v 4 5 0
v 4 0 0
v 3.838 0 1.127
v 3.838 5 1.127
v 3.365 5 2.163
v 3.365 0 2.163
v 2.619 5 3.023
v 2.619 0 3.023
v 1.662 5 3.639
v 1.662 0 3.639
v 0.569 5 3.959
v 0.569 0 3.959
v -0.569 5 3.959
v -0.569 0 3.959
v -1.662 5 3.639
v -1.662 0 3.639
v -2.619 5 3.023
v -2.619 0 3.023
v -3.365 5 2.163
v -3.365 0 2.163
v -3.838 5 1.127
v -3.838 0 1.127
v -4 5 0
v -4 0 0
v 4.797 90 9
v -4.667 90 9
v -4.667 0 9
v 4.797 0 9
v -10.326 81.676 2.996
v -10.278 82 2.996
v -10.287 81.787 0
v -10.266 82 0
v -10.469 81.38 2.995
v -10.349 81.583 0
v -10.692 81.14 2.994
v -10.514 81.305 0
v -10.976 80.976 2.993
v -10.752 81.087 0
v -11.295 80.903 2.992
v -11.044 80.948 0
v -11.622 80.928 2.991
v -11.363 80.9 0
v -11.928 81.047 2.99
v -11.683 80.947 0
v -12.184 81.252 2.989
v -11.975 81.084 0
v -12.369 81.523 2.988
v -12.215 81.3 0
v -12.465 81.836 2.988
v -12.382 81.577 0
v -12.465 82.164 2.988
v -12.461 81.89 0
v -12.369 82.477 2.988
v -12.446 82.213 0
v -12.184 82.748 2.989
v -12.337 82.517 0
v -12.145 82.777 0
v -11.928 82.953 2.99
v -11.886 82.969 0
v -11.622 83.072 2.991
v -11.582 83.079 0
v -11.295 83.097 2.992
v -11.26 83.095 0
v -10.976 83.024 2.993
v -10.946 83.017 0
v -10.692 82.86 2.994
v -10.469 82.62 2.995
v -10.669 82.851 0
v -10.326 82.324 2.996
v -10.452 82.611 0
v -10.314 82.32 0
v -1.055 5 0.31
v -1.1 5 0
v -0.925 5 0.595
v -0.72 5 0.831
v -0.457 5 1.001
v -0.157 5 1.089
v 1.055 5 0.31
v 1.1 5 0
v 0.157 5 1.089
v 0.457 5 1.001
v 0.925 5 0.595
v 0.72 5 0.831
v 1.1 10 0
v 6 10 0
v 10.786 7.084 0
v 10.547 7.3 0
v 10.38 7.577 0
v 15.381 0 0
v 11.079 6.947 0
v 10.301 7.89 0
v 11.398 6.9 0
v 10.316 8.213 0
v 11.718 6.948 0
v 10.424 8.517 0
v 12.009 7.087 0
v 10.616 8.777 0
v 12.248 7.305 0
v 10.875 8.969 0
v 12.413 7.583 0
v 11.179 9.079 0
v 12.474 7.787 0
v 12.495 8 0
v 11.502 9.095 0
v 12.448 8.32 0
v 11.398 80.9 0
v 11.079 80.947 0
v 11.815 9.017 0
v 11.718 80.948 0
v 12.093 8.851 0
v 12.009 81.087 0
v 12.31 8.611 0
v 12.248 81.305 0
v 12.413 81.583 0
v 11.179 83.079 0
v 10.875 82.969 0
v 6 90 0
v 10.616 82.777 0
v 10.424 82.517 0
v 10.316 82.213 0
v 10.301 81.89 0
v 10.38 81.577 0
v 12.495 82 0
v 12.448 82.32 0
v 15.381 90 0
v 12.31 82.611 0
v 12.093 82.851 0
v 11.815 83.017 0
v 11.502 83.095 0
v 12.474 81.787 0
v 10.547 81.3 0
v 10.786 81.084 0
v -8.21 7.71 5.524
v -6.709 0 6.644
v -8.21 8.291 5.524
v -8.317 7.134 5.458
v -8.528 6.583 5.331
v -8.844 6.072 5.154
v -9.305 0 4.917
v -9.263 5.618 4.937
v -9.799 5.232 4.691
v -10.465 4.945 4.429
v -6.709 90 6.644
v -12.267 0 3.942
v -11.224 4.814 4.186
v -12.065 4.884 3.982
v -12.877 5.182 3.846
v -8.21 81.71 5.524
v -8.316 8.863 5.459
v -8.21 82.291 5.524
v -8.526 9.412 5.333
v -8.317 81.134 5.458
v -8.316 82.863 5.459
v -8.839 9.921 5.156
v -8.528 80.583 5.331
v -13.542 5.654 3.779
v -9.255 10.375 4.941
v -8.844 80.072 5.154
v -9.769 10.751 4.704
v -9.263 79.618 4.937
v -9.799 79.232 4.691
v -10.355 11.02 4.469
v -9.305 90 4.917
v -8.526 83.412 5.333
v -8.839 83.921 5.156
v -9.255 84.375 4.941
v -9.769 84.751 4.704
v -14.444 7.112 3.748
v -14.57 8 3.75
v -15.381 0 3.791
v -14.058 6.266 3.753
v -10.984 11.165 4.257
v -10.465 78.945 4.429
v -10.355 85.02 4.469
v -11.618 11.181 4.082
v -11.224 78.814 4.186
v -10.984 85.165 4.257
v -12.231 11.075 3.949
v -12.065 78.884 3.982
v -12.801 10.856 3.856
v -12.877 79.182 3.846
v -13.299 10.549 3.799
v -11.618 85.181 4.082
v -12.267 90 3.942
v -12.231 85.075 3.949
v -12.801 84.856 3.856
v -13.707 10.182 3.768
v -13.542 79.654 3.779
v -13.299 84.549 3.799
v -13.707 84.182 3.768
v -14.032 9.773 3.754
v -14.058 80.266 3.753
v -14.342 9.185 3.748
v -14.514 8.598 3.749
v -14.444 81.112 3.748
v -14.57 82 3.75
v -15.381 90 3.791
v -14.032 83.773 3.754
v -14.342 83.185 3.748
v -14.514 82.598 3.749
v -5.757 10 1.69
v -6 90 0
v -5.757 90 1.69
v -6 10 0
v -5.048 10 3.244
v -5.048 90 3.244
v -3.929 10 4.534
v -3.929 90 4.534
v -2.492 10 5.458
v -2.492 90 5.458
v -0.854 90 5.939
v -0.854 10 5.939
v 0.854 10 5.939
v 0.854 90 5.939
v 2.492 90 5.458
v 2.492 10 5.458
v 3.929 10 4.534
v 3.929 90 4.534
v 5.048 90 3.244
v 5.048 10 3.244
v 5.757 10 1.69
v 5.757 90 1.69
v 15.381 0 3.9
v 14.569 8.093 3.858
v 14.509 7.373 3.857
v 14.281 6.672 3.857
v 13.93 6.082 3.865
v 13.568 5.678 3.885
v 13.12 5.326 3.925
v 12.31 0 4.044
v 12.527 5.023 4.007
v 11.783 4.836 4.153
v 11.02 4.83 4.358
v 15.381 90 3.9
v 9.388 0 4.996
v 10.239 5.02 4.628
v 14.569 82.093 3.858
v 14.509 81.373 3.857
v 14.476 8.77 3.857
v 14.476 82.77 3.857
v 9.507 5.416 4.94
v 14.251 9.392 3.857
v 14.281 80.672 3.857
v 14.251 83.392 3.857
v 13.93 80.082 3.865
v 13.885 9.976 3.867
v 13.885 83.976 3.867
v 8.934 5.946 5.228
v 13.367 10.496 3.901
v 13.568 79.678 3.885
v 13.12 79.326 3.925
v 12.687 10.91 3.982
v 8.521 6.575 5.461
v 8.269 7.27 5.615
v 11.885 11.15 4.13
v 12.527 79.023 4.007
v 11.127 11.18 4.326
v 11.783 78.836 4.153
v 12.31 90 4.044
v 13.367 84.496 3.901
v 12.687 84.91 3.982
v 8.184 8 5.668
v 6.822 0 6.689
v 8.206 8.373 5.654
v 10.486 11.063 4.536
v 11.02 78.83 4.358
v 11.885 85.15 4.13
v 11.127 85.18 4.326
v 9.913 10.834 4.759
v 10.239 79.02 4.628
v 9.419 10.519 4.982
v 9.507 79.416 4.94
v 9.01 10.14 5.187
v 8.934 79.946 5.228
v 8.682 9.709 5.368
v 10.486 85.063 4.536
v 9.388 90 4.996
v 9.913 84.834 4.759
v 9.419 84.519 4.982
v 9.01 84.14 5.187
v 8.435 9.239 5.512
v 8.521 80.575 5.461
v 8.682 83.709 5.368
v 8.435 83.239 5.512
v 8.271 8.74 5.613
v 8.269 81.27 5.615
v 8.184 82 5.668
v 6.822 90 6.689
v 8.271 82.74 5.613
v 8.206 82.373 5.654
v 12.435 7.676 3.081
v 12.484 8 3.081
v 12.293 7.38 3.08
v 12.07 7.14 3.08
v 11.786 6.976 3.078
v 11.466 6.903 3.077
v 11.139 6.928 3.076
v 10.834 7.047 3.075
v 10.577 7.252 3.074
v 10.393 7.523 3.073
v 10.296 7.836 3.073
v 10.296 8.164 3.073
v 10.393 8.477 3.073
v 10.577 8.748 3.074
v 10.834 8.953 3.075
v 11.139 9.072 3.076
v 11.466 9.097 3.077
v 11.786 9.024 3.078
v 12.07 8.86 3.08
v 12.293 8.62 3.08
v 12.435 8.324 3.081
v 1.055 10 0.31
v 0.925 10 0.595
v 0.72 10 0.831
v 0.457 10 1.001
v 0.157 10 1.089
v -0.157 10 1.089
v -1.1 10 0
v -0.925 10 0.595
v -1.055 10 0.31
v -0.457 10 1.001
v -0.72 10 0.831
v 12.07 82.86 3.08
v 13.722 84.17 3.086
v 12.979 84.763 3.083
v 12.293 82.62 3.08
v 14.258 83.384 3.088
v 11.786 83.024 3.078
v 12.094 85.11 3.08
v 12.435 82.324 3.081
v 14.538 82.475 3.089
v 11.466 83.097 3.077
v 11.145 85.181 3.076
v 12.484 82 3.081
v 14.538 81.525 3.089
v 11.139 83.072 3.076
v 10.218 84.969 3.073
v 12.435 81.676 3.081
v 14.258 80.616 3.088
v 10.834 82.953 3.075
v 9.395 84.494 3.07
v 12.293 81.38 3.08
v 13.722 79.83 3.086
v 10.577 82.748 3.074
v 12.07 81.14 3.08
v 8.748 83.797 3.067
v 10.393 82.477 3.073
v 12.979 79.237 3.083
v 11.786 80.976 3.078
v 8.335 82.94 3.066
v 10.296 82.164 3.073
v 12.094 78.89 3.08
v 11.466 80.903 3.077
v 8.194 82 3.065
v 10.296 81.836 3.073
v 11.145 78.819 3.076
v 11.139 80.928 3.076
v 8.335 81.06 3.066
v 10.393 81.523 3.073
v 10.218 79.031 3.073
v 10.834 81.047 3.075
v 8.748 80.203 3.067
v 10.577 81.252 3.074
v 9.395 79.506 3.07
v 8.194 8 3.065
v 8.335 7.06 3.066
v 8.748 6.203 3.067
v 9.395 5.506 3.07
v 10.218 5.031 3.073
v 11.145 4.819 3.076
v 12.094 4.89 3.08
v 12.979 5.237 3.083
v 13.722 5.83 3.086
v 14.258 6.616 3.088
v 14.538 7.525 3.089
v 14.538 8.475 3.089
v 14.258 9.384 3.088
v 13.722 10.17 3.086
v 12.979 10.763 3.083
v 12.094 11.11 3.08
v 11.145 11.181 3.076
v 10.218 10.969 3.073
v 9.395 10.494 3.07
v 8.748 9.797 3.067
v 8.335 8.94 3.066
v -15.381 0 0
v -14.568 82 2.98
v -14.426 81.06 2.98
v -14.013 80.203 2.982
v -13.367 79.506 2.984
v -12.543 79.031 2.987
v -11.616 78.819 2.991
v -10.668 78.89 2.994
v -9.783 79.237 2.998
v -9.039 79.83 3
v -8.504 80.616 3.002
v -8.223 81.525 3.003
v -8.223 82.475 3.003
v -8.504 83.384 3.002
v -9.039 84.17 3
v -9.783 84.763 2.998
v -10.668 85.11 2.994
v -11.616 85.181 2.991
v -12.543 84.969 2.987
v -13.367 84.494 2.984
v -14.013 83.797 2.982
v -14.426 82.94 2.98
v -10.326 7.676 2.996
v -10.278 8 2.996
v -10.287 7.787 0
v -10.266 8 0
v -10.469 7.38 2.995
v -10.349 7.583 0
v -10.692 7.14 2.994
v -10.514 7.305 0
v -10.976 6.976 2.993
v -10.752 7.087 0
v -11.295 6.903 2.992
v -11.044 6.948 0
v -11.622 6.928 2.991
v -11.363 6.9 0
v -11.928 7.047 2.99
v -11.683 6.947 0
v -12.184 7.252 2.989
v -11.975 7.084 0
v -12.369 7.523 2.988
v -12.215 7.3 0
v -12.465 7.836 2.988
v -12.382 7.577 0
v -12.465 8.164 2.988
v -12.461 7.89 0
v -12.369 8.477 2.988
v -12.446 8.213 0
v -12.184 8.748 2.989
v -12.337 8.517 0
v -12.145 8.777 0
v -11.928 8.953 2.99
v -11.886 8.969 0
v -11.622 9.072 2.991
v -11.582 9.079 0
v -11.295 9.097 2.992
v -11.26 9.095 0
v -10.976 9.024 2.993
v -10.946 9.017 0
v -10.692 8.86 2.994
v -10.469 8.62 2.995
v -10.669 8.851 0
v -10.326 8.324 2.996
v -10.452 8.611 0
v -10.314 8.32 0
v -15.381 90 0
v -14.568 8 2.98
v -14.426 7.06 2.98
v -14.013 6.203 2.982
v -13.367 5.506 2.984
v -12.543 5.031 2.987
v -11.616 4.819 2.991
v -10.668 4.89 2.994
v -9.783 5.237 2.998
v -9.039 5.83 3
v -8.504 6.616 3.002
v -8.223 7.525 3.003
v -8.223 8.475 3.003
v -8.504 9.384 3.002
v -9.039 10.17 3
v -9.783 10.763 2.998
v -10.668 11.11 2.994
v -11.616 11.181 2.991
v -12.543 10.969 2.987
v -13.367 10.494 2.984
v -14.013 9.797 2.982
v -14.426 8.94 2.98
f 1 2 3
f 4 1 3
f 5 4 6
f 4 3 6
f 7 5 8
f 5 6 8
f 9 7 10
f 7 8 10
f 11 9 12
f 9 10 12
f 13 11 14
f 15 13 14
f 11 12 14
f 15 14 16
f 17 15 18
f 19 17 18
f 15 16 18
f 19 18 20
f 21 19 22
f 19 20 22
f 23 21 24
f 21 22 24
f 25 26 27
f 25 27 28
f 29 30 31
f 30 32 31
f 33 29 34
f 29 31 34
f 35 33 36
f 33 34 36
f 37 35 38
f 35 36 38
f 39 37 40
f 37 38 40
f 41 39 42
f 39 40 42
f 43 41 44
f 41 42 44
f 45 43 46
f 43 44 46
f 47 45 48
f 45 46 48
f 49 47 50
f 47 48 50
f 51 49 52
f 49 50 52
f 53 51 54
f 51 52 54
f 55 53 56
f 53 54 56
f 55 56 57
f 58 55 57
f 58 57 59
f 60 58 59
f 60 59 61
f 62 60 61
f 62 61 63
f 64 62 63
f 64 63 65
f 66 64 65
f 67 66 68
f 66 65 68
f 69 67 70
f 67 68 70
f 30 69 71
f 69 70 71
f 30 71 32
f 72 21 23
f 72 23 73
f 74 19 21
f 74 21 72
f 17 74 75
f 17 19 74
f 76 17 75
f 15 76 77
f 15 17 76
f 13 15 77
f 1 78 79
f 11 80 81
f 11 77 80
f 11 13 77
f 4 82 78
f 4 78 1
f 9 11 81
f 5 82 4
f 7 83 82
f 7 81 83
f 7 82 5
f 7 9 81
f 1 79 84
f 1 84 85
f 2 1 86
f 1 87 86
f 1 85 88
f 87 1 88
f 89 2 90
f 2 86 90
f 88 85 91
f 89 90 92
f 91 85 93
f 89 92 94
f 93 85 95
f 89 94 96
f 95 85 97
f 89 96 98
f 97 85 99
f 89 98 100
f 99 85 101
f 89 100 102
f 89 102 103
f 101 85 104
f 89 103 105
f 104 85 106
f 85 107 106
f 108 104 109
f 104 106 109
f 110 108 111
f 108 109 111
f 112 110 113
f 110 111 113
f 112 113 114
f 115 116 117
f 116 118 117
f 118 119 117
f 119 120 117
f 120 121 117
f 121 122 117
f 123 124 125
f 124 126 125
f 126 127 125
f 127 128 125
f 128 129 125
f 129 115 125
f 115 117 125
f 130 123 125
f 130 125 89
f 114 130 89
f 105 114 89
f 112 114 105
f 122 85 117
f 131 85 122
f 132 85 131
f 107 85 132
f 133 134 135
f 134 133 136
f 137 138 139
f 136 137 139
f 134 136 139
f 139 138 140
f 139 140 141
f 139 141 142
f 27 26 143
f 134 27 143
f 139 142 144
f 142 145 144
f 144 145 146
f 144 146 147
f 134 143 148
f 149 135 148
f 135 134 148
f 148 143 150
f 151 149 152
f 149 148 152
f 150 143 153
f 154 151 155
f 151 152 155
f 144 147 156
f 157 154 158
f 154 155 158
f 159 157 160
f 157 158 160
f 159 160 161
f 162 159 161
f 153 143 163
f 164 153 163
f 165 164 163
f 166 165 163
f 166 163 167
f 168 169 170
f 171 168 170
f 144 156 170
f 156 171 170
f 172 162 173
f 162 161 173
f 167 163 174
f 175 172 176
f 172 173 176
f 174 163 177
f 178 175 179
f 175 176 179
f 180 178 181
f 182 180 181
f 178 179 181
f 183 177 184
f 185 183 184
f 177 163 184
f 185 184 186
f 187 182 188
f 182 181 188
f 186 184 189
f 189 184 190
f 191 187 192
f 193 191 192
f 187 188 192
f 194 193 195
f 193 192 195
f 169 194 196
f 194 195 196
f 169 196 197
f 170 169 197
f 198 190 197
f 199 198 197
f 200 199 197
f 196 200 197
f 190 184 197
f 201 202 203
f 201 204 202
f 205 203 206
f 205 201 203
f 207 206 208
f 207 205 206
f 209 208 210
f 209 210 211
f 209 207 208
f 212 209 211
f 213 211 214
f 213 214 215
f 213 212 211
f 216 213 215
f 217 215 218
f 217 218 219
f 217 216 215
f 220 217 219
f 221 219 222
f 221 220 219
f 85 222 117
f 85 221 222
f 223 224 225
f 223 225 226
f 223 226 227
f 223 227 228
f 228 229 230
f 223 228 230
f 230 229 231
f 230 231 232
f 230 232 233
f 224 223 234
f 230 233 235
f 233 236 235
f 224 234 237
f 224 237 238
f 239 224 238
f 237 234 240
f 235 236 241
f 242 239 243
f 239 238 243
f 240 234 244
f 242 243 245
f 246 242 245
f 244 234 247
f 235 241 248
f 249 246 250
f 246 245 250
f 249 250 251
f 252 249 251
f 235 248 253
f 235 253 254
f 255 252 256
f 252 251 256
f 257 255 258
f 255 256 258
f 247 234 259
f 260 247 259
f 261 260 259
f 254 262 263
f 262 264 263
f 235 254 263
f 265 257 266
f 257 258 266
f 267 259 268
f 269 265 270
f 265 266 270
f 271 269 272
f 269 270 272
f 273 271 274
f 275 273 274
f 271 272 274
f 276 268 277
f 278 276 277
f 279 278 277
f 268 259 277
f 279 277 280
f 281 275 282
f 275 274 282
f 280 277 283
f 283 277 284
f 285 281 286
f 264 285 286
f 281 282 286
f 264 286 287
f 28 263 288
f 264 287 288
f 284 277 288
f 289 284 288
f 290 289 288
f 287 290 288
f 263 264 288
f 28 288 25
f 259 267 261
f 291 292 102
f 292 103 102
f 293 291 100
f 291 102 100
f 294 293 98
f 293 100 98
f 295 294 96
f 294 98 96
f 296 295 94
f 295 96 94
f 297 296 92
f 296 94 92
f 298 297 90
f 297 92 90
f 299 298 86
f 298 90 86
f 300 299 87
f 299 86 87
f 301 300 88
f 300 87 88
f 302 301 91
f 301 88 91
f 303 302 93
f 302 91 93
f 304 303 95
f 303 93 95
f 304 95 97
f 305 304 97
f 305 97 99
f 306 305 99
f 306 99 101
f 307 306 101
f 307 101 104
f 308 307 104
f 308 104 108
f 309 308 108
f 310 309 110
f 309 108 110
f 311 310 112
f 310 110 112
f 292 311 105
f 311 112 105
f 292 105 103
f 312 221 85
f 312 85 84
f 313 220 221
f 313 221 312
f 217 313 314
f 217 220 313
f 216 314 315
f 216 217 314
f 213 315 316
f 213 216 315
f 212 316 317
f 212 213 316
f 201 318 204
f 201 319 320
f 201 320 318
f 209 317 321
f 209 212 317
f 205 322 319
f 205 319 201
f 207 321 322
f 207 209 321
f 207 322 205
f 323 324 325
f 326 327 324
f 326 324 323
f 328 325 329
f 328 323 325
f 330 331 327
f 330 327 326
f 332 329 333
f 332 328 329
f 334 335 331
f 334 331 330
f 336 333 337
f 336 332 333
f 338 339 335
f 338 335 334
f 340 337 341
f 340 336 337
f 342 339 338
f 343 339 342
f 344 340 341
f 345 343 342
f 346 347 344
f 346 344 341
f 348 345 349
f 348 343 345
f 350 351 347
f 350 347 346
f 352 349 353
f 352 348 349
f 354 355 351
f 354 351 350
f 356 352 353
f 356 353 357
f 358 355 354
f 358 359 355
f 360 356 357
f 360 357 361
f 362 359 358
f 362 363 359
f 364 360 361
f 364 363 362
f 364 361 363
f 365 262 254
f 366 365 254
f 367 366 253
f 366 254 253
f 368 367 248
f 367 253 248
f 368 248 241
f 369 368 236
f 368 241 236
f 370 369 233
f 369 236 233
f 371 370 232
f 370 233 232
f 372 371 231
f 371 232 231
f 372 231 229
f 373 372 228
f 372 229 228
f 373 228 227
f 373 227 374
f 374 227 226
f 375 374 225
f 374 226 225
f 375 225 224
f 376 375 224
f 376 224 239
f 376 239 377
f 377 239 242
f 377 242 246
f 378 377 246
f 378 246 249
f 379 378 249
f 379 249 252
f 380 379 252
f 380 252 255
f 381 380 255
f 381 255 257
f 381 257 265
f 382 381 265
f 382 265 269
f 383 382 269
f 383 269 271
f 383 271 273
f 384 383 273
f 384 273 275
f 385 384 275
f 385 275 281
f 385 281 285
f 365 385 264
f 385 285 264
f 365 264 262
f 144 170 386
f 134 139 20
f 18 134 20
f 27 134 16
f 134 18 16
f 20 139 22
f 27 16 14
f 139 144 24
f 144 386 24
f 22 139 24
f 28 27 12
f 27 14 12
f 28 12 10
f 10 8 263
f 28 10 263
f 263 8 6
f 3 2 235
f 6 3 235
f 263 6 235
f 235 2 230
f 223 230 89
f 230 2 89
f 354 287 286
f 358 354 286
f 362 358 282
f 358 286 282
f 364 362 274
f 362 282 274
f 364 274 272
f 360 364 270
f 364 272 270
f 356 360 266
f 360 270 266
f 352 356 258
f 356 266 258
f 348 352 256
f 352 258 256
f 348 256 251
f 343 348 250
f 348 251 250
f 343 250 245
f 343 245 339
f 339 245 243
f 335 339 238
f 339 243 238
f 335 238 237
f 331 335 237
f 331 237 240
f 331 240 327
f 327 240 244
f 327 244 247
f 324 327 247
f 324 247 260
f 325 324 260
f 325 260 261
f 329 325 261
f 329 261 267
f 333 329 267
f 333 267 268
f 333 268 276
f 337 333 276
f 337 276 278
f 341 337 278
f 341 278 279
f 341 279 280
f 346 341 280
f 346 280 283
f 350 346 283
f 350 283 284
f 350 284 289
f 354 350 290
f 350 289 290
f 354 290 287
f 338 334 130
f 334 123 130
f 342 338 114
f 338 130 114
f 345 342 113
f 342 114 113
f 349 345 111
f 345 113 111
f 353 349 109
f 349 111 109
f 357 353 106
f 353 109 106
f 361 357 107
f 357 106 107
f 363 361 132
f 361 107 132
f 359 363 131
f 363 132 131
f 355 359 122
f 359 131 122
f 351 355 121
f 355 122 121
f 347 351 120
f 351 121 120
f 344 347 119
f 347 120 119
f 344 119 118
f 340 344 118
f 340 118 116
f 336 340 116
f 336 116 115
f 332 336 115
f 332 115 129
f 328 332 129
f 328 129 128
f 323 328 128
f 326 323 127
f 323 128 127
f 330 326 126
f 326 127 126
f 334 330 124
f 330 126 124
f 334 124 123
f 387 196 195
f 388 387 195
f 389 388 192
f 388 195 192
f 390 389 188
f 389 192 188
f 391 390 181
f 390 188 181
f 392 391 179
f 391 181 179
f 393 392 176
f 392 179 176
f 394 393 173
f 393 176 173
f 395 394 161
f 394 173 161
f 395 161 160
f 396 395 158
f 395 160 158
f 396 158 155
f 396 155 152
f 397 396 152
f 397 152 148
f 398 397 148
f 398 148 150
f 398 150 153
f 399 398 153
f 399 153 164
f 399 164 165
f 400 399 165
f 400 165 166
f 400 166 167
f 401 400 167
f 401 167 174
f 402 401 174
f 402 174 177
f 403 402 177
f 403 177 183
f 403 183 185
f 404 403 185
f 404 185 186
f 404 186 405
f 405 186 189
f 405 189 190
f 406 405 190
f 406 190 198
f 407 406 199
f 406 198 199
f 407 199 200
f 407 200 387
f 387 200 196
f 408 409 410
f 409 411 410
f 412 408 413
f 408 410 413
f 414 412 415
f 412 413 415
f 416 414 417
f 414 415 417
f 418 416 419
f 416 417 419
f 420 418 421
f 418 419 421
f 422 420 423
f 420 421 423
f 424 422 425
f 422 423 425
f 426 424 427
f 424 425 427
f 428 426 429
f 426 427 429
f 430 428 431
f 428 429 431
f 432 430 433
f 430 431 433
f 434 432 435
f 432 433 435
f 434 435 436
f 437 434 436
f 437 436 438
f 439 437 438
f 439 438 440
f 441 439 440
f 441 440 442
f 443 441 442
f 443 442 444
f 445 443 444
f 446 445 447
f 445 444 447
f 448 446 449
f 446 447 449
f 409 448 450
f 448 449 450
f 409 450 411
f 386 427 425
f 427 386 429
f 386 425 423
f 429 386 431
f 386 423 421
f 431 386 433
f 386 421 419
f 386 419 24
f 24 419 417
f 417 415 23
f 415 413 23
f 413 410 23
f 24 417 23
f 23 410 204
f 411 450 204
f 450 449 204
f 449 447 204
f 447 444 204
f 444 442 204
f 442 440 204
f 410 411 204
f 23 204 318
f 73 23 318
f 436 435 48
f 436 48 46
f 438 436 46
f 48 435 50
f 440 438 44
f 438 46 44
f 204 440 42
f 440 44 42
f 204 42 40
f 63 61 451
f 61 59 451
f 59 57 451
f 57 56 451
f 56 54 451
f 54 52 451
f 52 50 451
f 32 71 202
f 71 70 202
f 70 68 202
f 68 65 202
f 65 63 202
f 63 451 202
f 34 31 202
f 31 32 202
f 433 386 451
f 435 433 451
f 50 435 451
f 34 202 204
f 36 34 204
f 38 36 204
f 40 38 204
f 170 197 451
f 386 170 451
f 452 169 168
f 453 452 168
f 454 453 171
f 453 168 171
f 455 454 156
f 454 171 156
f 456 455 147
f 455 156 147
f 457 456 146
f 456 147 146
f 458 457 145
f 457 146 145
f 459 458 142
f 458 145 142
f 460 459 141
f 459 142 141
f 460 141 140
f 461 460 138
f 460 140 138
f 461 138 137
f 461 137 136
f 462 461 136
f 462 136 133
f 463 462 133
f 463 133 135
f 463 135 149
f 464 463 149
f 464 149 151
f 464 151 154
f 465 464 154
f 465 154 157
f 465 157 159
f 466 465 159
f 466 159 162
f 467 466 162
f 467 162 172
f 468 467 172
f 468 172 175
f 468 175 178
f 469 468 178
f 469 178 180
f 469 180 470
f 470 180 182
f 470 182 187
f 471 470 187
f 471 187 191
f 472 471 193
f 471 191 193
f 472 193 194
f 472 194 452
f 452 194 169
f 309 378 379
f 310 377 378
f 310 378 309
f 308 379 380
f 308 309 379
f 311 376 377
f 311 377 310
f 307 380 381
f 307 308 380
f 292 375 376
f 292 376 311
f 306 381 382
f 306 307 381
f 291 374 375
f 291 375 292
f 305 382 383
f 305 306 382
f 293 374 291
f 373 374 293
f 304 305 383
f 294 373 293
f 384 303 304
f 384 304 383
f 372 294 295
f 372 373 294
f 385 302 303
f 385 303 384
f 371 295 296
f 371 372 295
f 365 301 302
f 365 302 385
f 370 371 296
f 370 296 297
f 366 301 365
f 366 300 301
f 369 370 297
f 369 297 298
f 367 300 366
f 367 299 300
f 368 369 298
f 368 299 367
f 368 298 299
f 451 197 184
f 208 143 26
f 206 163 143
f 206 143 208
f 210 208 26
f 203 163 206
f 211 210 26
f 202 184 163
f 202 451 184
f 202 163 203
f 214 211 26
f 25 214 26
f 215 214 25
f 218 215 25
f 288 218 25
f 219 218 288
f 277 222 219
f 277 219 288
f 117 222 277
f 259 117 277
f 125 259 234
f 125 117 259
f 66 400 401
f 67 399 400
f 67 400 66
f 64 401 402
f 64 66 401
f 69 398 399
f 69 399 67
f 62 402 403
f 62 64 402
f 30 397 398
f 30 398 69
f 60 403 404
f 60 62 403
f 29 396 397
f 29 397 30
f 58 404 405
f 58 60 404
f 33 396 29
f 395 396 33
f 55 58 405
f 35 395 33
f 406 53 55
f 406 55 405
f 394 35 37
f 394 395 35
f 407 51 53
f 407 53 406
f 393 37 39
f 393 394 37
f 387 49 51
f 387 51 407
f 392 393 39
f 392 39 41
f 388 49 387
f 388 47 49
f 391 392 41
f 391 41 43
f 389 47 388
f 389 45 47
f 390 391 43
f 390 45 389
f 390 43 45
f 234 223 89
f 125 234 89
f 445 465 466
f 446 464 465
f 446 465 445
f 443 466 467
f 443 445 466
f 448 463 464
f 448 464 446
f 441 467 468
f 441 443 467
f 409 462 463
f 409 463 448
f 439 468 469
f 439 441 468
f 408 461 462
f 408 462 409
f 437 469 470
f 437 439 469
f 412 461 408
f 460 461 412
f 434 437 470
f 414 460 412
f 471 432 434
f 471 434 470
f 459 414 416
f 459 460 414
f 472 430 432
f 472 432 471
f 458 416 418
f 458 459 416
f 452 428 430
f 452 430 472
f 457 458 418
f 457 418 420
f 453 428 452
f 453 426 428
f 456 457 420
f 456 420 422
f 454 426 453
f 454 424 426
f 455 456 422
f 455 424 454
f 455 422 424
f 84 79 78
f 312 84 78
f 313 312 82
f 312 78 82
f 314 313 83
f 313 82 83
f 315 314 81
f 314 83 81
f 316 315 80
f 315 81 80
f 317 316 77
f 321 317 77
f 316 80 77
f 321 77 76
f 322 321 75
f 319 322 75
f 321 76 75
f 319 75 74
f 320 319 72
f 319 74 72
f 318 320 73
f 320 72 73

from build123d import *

# Parameters (mm, degrees)
ROTATION1_ANGLE                                     = 180
SCHNITT_LINEAR_AUSTRAGEN2_DEPTH                     = 92.33454987
SCHNITT_LINEAR_AUSTRAGEN2_DEPTH_BACK                = 90
SCHNITT_LINEAR_AUSTRAGEN3_DEPTH                     = 92.33454987
SCHNITT_LINEAR_AUSTRAGEN3_DEPTH_BACK                = 90
SKIZZE8_W                                           = 10
SKIZZE8_H                                           = 5
AUFSATZ_LINEAR_AUSTRAGEN2_DEPTH                     = 90
SKIZZE9_W                                           = 10
SKIZZE9_H                                           = 5
AUFSATZ_LINEAR_AUSTRAGEN3_DEPTH                     = 90
SKIZZE16_R                                          = 1.1
SCHNITT_LINEAR_AUSTRAGEN8_DEPTH                     = 93.717898057
SKIZZE18_R                                          = 4
SCHNITT_LINEAR_AUSTRAGEN9_DEPTH                     = 5
SKIZZE20_W                                          = 21.700648505
SKIZZE20_H                                          = 2
SCHNITT_LINEAR_AUSTRAGEN10_DEPTH                    = 93.717898057
SKIZZE22_R                                          = 11.608493419
SKIZZE22_R_2                                        = 11.500591483
SCHNITT_LINEAR_AUSTRAGEN17_DEPTH                    = 93.501938467
SKIZZE24_W                                          = 4
SKIZZE24_H                                          = 5
SCHNITT_LINEAR_AUSTRAGEN18_DEPTH                    = 93.501938467
STIRNSENKUNG_F_R_M2_SECHSKANTSCHRAUBE_G_D           = 2.2
STIRNSENKUNG_F_R_M2_SECHSKANTSCHRAUBE_G_DEPTH       = 12
STIRNSENKUNG_F_R_M2_SECHSKANTSCHRAUBE_G_CBORE_D     = 6.38
STIRNSENKUNG_F_R_M2_SECHSKANTSCHRAUBE_G_CBORE_DEPTH = 3.1
STIRNSENKUNG_F_R_M2_SECHSKANTSCHRAUBE_G_TIP         = 0.660946681


with BuildPart() as part:
    # Skizze3 → Rotation1 (revolve)
    with BuildSketch(Plane.XY):
        Polygon((0, 0), (-11, 0), (-11, 90), (-6, 90), (-6, 10), (0, 10), align=None)
    revolve(axis=Axis((0, 0, 0), (0, 1, 0)), revolution_arc=ROTATION1_ANGLE)

    # Skizze6 → Schnitt-Linear austragen2 (cut, two sides: drawn at the far end of the back side and taken through both)
    with BuildSketch(Plane(origin=(0, 90, 0), x_dir=(1, 0, 0), z_dir=(0, 1, 0)).offset(-SCHNITT_LINEAR_AUSTRAGEN2_DEPTH_BACK)):
        Polygon((-9.380624863, -62.0642209), (-9.380624863, -5.744900102), (-9.380624863, 0), (-9.380624863, 56.319320799), (-122.01926646, 56.319320799), (-122.01926646, -62.0642209), align=None)
    extrude(amount=SCHNITT_LINEAR_AUSTRAGEN2_DEPTH + SCHNITT_LINEAR_AUSTRAGEN2_DEPTH_BACK, mode=Mode.SUBTRACT)

    # Skizze7 → Schnitt-Linear austragen3 (cut, two sides: drawn at the far end of the back side and taken through both)
    with BuildSketch(Plane.XZ.offset(-SCHNITT_LINEAR_AUSTRAGEN3_DEPTH_BACK)):
        Polygon((9.380624863, 59.241313346), (9.380624863, 5.744900102), (9.380624863, 0), (9.380624863, -53.496413245), (116.373451353, -53.496413245), (116.373451353, 59.241313346), align=None)
    extrude(amount=SCHNITT_LINEAR_AUSTRAGEN3_DEPTH + SCHNITT_LINEAR_AUSTRAGEN3_DEPTH_BACK, mode=Mode.SUBTRACT)

    # Skizze8 → Aufsatz-Linear austragen2 (add)
    with BuildSketch(Plane(origin=(0, 90, 0), x_dir=(1, 0, 0), z_dir=(0, 1, 0))):
        with Locations((-14.380624863, -2.5)):
            Rectangle(SKIZZE8_W, SKIZZE8_H)
    extrude(amount=-AUFSATZ_LINEAR_AUSTRAGEN2_DEPTH)

    # Skizze9 → Aufsatz-Linear austragen3 (add)
    with BuildSketch(Plane(origin=(0, 90, 0), x_dir=(1, 0, 0), z_dir=(0, 1, 0))):
        with Locations((14.380624863, -2.5)):
            Rectangle(SKIZZE9_W, SKIZZE9_H)
    extrude(amount=-AUFSATZ_LINEAR_AUSTRAGEN3_DEPTH)

    # Skizze16 → Schnitt-Linear austragen8 (cut, through all)
    with BuildSketch(Plane.XZ):
        Circle(SKIZZE16_R)
    extrude(amount=-SCHNITT_LINEAR_AUSTRAGEN8_DEPTH, mode=Mode.SUBTRACT)

    # Skizze18 → Schnitt-Linear austragen9 (cut)
    with BuildSketch(Plane.XZ):
        Circle(SKIZZE18_R)
    extrude(amount=-SCHNITT_LINEAR_AUSTRAGEN9_DEPTH, mode=Mode.SUBTRACT)

    # Skizze20 → Schnitt-Linear austragen10 (cut, through all)
    with BuildSketch(Plane(origin=(0, 90, 0), x_dir=(1, 0, 0), z_dir=(0, 1, 0))):
        with Locations((-0.450220923, -10)):
            Rectangle(SKIZZE20_W, SKIZZE20_H)
    extrude(amount=-SCHNITT_LINEAR_AUSTRAGEN10_DEPTH, mode=Mode.SUBTRACT)

    # Skizze22 → Schnitt-Linear austragen17 (cut, through all)
    with BuildSketch(Plane(origin=(0, 90, 0), x_dir=(1, 0, 0), z_dir=(0, 1, 0))):
        with Locations((-14.380624863, -15.356814397)):
            Circle(SKIZZE22_R)
        with Locations((14.380624863, -15.356814397)):
            Circle(SKIZZE22_R_2)
    extrude(amount=-SCHNITT_LINEAR_AUSTRAGEN17_DEPTH, mode=Mode.SUBTRACT)

    # Skizze24 → Schnitt-Linear austragen18 (cut, through all)
    with BuildSketch(Plane(origin=(0, 90, 0), x_dir=(1, 0, 0), z_dir=(0, 1, 0))):
        with Locations((17.380624863, -2.5)):
            Rectangle(SKIZZE24_W, SKIZZE24_H)
        with Locations((-17.380624863, -2.5)):
            Rectangle(SKIZZE24_W, SKIZZE24_H)
    extrude(amount=-SCHNITT_LINEAR_AUSTRAGEN18_DEPTH, mode=Mode.SUBTRACT)

    # Stirnsenkung für M2 Sechskantschraube, Gewinde bis Kopf10
    with Locations(Plane(origin=(-0.023013558, 0, 6.13421813), x_dir=(-0.9999929625632231, 0, -0.0037516428439037797), z_dir=(-0.0037516428439037797, 0, 0.9999929625632231))):
        with Locations((11.36629237, -82), (11.36629237, -8), (-11.39514721, -8), (-11.39514721, -82)):
            CounterBoreHole(STIRNSENKUNG_F_R_M2_SECHSKANTSCHRAUBE_G_D / 2, STIRNSENKUNG_F_R_M2_SECHSKANTSCHRAUBE_G_CBORE_D / 2, STIRNSENKUNG_F_R_M2_SECHSKANTSCHRAUBE_G_CBORE_DEPTH, depth=STIRNSENKUNG_F_R_M2_SECHSKANTSCHRAUBE_G_DEPTH)
            with Locations((0, 0, -(STIRNSENKUNG_F_R_M2_SECHSKANTSCHRAUBE_G_DEPTH + STIRNSENKUNG_F_R_M2_SECHSKANTSCHRAUBE_G_TIP / 2))):  # 118° drill point
                Cone(0, STIRNSENKUNG_F_R_M2_SECHSKANTSCHRAUBE_G_D / 2, STIRNSENKUNG_F_R_M2_SECHSKANTSCHRAUBE_G_TIP, mode=Mode.SUBTRACT)


solid = part.part
